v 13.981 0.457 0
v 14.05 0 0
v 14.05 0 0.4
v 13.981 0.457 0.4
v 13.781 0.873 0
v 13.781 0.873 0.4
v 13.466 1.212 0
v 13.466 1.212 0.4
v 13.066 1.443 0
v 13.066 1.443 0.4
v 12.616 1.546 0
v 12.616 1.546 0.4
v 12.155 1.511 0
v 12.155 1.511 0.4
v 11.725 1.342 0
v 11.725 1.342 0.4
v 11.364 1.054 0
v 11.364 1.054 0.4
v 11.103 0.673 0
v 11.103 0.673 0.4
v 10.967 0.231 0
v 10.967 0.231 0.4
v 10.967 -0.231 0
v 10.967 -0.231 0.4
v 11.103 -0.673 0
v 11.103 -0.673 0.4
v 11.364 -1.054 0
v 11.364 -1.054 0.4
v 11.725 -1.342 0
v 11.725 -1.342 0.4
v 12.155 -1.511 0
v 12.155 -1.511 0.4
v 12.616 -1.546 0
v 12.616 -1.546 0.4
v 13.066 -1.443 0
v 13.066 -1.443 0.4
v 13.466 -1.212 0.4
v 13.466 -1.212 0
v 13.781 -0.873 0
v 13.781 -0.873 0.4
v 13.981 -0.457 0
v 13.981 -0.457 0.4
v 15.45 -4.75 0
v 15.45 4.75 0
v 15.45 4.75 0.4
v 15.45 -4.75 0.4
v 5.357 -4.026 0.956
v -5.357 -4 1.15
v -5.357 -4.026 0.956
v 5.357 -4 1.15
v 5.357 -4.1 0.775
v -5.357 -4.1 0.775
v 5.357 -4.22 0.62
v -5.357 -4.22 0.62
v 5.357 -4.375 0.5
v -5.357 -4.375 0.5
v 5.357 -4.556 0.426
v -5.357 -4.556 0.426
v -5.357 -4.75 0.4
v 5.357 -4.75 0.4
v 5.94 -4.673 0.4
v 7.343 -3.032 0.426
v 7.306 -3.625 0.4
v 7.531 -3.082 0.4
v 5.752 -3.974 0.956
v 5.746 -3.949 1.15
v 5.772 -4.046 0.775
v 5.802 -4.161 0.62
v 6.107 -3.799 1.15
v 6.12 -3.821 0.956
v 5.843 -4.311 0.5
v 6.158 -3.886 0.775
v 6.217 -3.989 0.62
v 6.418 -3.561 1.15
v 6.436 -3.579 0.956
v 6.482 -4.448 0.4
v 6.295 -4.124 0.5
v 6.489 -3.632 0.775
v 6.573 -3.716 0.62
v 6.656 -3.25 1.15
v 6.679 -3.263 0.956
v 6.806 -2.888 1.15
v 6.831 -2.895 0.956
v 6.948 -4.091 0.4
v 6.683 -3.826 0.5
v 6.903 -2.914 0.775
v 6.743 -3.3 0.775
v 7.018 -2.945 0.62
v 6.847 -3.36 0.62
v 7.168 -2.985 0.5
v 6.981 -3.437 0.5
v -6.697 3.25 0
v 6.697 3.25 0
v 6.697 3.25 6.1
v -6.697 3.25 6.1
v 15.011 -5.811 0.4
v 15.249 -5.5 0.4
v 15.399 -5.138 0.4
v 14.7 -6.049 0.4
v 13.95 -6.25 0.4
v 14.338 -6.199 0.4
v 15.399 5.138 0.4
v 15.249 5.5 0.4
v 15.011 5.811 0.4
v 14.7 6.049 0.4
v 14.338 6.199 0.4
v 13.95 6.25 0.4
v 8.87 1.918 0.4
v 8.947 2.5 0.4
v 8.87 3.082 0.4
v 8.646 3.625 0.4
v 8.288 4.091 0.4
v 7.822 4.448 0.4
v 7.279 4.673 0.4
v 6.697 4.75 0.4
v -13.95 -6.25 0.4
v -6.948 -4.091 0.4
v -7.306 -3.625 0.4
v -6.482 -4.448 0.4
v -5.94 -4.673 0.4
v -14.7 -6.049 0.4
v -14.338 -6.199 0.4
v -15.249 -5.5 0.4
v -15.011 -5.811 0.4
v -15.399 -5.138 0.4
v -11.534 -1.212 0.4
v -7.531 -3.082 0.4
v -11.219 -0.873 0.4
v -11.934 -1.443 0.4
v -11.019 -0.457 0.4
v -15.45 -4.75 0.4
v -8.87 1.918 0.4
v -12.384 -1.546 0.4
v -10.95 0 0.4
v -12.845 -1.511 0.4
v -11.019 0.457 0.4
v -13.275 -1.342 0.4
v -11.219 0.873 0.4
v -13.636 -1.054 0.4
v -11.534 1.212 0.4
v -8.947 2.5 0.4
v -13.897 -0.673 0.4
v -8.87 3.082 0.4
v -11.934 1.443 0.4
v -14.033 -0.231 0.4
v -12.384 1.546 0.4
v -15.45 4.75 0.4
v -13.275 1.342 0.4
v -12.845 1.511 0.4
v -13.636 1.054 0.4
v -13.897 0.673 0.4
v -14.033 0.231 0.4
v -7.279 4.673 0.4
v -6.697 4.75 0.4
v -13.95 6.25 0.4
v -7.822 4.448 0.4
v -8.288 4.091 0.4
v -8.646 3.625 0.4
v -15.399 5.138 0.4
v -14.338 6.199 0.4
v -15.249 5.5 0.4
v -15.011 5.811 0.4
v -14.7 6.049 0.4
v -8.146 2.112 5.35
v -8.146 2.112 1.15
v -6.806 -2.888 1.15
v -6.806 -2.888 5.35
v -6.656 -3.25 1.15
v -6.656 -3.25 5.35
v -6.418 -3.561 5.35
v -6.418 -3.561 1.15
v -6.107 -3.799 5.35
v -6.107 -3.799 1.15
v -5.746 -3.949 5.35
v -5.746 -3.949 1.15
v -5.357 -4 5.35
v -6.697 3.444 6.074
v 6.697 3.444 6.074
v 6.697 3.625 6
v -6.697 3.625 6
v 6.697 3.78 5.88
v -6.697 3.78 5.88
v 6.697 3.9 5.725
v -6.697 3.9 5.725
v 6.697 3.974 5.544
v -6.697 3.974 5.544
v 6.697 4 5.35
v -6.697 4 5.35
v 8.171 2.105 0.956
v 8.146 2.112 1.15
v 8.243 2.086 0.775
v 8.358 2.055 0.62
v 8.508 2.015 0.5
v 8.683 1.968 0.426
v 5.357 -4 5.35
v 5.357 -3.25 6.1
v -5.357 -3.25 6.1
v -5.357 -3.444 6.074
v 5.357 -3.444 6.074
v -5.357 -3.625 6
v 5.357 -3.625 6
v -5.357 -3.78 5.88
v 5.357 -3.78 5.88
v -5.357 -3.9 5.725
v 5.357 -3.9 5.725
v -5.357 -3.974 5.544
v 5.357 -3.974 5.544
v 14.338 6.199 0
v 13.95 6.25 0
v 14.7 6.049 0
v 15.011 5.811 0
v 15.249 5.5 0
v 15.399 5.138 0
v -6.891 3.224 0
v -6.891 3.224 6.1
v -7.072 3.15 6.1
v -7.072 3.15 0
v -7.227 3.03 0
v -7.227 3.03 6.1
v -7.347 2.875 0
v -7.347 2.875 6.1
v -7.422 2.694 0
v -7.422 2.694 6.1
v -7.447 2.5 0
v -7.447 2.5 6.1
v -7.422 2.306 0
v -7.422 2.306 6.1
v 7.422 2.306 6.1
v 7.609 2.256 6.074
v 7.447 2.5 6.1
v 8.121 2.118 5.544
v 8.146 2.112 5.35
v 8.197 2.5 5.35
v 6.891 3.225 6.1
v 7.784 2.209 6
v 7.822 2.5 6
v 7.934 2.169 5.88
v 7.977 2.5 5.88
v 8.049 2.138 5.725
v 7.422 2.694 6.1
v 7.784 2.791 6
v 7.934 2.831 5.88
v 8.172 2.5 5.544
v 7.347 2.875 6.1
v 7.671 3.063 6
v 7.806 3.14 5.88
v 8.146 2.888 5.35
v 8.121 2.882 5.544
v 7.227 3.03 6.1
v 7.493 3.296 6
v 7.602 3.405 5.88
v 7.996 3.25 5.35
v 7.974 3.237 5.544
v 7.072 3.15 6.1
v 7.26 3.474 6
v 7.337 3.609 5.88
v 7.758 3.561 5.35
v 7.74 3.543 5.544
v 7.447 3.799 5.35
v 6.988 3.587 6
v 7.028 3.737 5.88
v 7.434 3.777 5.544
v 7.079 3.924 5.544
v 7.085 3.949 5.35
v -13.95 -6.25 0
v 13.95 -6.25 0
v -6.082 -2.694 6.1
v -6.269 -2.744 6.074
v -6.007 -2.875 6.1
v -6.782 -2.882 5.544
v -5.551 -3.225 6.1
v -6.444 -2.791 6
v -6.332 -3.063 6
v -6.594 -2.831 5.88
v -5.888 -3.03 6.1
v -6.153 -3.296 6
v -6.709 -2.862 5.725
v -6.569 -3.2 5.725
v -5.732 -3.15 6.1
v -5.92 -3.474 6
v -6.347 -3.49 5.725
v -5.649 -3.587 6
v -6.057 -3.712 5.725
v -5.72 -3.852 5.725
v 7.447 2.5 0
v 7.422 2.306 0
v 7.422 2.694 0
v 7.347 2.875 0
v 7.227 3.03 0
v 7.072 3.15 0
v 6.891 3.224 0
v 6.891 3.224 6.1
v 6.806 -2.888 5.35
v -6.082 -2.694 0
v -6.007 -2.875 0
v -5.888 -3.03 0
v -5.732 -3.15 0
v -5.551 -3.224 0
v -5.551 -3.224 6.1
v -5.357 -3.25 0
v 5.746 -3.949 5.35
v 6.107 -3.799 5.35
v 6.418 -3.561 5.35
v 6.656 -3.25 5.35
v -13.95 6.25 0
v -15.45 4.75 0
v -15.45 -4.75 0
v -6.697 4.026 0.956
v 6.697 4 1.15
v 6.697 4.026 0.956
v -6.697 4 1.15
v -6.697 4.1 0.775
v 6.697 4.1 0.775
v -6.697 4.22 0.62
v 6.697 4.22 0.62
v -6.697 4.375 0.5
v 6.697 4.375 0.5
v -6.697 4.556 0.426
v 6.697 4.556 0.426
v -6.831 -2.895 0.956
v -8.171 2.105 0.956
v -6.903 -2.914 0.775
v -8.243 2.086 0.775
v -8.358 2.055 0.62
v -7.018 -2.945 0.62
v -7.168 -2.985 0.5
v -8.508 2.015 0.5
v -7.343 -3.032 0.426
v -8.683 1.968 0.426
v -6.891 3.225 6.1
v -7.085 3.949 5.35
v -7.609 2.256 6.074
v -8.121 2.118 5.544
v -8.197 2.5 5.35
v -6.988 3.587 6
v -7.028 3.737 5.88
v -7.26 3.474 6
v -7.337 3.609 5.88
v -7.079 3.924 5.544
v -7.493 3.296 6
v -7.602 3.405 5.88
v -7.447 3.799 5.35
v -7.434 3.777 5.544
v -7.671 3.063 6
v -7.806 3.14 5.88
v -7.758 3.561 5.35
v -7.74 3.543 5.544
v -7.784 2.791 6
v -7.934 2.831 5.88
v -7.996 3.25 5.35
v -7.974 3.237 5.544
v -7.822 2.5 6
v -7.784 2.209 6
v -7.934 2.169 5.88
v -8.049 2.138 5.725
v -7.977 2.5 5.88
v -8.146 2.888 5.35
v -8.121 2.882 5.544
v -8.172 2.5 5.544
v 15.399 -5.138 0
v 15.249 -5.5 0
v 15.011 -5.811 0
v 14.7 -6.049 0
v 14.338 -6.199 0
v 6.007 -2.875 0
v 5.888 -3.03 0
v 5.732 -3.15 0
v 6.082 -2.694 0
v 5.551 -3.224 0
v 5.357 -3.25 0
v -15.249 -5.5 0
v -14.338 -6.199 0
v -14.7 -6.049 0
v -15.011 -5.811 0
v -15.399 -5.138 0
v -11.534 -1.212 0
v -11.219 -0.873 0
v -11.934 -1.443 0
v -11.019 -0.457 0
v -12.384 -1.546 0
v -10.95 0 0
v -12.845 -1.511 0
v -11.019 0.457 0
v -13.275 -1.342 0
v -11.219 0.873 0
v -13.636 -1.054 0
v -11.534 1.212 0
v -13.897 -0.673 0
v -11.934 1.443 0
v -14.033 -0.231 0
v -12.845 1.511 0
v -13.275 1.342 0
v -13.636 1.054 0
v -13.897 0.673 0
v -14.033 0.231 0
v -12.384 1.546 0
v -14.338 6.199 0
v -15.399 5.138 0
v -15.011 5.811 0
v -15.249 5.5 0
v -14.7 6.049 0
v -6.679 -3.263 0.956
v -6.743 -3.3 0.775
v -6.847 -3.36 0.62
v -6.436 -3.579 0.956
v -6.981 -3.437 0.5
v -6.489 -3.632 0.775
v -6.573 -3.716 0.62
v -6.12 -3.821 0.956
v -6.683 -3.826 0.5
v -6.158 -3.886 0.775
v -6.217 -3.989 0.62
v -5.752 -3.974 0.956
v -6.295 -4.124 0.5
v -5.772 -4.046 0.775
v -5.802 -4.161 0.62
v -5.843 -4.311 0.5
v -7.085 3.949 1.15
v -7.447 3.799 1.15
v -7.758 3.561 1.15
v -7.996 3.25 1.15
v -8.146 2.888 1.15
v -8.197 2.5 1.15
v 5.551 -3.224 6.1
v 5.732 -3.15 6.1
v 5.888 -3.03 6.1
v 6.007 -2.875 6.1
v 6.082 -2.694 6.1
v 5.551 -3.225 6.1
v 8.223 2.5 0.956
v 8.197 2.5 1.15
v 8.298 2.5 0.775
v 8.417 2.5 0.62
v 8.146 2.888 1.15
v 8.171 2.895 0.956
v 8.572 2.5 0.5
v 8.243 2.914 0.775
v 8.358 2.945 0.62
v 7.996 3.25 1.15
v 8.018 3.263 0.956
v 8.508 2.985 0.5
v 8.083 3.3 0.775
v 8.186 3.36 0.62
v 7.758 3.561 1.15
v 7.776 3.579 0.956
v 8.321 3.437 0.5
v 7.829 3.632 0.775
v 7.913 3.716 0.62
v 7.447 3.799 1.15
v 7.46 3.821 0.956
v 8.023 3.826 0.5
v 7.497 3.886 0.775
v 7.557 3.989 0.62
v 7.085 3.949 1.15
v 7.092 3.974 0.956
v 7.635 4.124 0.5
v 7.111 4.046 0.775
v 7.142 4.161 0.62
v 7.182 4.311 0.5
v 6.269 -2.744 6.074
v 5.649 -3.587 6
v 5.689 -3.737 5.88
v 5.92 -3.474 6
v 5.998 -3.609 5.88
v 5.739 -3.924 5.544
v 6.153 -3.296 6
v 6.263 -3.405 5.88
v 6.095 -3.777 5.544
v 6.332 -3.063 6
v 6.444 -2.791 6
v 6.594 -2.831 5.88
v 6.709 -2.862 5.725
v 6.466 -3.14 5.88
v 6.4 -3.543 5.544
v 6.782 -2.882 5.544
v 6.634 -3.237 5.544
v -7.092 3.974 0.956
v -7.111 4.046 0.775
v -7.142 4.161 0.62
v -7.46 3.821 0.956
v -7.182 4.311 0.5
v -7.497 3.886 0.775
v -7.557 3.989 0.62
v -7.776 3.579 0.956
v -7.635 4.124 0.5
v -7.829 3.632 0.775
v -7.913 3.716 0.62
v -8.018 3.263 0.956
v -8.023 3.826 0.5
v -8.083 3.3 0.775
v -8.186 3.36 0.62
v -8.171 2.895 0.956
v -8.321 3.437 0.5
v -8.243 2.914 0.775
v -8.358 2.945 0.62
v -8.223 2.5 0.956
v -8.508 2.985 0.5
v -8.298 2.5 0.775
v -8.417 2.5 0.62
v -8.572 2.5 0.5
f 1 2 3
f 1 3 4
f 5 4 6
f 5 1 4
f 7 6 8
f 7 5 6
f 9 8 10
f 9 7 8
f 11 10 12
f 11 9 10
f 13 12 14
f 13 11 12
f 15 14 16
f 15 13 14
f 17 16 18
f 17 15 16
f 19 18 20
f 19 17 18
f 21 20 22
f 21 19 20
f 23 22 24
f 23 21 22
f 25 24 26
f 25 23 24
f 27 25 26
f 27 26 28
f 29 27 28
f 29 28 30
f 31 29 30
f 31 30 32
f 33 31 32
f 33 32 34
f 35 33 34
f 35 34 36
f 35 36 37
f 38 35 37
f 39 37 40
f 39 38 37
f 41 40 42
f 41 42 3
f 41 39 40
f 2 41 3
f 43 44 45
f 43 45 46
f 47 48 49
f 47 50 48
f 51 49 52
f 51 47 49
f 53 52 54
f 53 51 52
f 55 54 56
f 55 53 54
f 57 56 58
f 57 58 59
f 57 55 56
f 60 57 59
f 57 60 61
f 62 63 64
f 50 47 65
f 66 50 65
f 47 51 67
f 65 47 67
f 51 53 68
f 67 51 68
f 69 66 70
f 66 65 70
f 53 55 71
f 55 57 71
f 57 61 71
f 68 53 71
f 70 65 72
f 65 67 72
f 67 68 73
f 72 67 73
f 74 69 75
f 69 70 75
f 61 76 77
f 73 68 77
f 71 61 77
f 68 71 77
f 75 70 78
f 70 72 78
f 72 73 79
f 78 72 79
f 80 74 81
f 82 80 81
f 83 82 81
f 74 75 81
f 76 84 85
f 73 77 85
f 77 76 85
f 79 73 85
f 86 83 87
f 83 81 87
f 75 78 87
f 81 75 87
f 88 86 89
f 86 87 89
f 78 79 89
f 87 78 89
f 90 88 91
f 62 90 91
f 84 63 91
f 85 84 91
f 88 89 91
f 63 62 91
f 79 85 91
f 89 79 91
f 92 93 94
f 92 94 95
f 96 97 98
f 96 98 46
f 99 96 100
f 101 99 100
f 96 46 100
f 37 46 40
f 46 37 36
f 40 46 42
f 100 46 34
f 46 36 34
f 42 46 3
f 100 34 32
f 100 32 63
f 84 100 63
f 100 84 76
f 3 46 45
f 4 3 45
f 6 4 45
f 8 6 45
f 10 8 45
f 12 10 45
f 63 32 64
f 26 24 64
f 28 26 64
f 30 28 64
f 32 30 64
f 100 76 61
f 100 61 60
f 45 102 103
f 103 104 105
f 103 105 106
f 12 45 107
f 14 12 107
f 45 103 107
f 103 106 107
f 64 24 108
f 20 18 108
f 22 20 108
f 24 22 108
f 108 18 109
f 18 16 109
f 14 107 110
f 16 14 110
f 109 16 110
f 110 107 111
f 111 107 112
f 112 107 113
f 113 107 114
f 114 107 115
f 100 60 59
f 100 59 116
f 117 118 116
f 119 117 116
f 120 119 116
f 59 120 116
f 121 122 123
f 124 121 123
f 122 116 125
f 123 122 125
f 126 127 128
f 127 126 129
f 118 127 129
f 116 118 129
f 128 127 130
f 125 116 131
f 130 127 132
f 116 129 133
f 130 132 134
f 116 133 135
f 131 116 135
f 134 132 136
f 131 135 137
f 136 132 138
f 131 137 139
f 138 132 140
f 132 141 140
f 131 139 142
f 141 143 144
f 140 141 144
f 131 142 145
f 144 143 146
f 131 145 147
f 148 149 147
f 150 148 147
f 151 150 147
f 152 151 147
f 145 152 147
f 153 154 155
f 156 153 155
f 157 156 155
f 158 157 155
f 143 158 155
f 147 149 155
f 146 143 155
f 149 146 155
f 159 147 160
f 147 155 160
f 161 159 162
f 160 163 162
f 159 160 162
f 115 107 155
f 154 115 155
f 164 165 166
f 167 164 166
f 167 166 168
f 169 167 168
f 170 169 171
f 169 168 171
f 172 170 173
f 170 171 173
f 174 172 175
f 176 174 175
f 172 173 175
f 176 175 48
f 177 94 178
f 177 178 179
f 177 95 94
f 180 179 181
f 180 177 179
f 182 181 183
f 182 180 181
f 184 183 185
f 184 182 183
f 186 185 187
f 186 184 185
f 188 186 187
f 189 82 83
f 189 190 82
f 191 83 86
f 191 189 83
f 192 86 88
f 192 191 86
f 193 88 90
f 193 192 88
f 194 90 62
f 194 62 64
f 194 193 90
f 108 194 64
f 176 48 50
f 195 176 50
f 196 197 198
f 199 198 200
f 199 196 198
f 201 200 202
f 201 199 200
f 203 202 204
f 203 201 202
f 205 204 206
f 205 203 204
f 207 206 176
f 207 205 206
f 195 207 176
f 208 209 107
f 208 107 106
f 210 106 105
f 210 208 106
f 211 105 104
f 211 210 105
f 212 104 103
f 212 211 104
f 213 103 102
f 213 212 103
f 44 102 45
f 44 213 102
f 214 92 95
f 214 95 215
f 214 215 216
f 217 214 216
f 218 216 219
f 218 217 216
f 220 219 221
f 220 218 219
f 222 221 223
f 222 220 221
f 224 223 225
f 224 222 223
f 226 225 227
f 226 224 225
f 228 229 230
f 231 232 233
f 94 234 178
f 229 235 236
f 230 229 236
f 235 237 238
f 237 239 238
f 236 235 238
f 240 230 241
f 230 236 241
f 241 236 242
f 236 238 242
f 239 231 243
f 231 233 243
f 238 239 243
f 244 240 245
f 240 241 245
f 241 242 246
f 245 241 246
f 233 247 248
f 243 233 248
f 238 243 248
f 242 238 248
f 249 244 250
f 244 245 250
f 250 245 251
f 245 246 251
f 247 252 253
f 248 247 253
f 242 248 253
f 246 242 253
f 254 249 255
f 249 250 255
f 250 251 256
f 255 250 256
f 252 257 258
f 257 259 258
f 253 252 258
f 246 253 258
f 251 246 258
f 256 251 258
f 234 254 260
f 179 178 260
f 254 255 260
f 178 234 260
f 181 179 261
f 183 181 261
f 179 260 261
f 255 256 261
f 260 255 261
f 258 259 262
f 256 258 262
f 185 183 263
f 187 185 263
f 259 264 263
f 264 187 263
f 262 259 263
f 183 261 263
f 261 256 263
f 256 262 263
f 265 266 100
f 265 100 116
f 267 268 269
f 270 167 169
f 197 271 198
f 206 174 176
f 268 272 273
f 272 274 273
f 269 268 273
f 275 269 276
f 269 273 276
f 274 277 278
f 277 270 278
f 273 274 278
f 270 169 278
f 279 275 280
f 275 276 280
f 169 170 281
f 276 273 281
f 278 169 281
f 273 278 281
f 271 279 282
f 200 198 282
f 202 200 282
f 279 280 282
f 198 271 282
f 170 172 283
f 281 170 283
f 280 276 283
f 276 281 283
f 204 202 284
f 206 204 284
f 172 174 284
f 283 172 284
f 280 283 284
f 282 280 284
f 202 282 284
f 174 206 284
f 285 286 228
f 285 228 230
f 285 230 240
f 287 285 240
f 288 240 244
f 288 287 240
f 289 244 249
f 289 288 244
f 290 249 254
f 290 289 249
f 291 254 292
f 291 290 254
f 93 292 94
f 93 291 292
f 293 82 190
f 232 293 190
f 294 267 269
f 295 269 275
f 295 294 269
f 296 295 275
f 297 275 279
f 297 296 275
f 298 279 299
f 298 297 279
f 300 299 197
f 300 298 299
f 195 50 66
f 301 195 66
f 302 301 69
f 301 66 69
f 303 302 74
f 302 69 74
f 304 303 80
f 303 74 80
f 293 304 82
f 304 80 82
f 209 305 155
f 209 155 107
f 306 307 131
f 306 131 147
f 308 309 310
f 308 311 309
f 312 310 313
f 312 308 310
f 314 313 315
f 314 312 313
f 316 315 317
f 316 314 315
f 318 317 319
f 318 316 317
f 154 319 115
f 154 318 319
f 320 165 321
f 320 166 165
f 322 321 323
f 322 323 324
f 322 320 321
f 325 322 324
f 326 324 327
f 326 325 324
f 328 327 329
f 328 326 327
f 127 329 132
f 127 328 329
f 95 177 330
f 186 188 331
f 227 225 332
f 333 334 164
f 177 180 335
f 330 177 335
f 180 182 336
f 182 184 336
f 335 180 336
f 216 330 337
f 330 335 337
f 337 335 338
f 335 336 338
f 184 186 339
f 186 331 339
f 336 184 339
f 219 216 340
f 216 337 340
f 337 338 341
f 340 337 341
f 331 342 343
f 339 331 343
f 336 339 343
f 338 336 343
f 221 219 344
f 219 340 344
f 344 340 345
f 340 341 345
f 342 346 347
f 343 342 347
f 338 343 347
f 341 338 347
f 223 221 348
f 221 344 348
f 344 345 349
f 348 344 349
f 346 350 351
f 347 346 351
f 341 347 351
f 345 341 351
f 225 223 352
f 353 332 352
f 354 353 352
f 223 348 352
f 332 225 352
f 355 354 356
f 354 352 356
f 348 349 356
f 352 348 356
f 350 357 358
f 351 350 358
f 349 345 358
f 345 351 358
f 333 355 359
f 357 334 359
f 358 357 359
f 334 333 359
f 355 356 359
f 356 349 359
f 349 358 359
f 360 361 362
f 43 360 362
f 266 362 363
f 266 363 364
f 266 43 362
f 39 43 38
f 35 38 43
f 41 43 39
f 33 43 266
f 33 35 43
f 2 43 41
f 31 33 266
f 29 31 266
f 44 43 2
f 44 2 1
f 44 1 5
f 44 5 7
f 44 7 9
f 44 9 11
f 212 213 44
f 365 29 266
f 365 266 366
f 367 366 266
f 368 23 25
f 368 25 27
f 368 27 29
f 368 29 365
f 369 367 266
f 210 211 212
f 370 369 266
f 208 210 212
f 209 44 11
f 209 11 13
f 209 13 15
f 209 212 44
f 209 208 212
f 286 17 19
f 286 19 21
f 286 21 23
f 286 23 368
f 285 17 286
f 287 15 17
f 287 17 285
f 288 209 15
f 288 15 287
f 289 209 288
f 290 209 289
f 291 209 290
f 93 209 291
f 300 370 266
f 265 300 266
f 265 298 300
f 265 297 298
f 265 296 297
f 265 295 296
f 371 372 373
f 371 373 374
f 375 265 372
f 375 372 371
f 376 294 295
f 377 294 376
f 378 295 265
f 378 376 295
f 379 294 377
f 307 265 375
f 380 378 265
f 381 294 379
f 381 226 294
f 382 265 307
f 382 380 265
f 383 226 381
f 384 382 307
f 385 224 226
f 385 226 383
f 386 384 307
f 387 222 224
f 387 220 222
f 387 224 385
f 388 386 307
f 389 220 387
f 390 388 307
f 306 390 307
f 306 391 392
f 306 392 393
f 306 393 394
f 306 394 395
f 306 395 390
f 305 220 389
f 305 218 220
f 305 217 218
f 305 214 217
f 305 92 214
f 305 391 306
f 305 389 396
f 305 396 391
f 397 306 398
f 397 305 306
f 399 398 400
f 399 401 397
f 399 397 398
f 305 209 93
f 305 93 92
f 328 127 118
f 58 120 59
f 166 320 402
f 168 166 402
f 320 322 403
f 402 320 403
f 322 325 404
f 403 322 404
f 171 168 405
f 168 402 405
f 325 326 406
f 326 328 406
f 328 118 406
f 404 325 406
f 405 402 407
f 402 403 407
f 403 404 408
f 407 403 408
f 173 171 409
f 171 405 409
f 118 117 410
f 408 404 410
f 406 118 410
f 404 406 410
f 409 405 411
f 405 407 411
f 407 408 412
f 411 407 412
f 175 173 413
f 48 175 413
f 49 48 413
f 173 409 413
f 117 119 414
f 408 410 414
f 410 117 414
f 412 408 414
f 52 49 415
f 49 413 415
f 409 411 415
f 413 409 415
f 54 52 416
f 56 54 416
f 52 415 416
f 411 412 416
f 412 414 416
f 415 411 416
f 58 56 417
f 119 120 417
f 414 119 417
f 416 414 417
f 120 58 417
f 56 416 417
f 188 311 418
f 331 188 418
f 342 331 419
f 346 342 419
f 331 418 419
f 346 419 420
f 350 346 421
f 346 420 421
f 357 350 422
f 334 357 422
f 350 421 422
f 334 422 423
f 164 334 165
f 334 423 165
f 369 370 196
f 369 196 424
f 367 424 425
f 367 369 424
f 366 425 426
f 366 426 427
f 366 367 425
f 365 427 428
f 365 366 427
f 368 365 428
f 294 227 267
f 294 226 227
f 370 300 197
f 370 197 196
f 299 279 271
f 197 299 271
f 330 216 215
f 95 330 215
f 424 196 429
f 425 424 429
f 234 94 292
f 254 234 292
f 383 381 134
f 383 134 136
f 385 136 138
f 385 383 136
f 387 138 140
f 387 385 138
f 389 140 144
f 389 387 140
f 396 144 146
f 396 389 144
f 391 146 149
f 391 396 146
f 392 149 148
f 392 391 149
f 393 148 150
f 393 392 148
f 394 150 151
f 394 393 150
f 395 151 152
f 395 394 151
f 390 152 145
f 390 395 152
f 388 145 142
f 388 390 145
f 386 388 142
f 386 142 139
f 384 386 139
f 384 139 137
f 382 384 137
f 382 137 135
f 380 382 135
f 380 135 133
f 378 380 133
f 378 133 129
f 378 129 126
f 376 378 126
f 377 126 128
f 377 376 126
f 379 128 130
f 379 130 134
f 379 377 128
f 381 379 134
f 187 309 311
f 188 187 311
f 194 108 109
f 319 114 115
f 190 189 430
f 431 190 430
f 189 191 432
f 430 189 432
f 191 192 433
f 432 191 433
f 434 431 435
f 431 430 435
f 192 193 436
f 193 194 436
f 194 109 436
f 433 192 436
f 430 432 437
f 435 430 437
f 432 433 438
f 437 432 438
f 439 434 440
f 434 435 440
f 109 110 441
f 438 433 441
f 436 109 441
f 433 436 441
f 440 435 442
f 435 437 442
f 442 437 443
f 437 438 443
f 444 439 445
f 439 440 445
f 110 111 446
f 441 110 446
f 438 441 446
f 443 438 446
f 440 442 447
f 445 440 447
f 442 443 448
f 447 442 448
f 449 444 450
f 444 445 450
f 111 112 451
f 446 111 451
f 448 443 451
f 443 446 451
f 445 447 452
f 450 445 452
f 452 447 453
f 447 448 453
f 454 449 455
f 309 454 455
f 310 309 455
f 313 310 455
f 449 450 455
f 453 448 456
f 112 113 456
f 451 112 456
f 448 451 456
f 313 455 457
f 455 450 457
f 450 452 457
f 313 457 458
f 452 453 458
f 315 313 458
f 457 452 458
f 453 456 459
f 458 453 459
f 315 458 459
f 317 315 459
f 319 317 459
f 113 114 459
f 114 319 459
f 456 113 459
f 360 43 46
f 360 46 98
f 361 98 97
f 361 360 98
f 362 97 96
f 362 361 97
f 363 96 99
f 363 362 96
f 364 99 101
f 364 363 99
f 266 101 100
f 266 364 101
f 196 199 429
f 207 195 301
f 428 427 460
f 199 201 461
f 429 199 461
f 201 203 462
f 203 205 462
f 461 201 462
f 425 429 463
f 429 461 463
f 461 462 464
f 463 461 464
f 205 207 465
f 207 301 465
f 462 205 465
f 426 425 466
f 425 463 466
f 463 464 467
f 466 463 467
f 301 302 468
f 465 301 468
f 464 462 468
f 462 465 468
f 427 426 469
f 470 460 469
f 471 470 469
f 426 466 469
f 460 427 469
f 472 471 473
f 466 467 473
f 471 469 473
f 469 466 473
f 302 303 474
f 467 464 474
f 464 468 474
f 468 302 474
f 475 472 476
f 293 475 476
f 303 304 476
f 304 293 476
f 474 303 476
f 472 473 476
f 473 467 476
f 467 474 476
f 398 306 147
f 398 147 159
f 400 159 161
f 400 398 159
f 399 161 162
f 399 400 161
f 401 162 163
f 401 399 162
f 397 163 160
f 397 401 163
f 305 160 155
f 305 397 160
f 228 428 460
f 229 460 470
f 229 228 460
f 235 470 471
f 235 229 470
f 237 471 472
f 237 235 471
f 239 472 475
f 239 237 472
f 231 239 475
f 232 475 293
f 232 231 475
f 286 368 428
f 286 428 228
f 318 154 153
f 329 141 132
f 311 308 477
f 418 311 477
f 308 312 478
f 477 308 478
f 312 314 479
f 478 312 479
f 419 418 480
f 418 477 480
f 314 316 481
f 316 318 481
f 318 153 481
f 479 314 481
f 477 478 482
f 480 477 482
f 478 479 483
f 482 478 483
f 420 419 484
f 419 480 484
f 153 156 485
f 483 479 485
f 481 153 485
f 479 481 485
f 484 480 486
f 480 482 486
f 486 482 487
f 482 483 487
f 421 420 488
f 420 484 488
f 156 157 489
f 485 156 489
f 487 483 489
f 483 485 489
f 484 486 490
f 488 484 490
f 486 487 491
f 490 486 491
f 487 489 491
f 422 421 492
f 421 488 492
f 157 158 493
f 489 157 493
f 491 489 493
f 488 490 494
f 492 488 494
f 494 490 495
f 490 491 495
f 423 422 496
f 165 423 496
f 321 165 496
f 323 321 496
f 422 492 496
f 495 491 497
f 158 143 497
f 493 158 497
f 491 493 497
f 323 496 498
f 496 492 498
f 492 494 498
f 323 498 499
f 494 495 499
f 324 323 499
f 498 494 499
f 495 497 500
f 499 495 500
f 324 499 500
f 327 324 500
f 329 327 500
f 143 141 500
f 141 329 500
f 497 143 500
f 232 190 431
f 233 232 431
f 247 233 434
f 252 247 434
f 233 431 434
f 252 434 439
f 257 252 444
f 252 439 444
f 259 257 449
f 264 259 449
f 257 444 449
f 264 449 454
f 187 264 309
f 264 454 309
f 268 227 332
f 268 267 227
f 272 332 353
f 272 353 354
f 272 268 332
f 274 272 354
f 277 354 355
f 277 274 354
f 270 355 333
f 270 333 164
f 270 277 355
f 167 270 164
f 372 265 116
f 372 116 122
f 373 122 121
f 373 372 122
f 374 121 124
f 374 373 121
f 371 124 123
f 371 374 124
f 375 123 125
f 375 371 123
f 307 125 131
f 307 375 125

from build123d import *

# Parameters (mm, degrees)
SKETCH1_R           = 1.55
BOSS_EXTRUDE1_DEPTH = 0.4
BOSS_EXTRUDE2_DEPTH = 5.7
FILLET1_R           = 0.75


with BuildPart() as part:
    # Sketch1 → Boss-Extrude1 (new body)
    with BuildSketch(Plane.XY):
        with BuildLine():
            Line((-13.95, 6.25), (13.95, 6.25))
            ThreePointArc((13.95, 6.25), (15.010660172, 5.810660172), (15.45, 4.75))
            Line((15.45, 4.75), (15.45, -4.75))
            ThreePointArc((15.45, -4.75), (15.010660172, -5.810660172), (13.95, -6.25))
            Line((13.95, -6.25), (-13.95, -6.25))
            ThreePointArc((-13.95, -6.25), (-15.010660172, -5.810660172), (-15.45, -4.75))
            Line((-15.45, -4.75), (-15.45, 4.75))
            ThreePointArc((-15.45, 4.75), (-15.010660172, 5.810660172), (-13.95, 6.25))
        make_face()
        with Locations((-12.5, 0)):
            Circle(SKETCH1_R, mode=Mode.SUBTRACT)
        with Locations((12.5, 0)):
            Circle(SKETCH1_R, mode=Mode.SUBTRACT)
        with BuildLine():
            Line((-6.697085729, 3.25), (6.697085729, 3.25))
            ThreePointArc((6.697085729, 3.25), (7.292100735, 2.956571072), (7.421530099, 2.305885716))
            Line((7.421530099, 2.305885716), (6.081784137, -2.694114284))
            ThreePointArc((6.081784137, -2.694114284), (5.813910839, -3.095015005), (5.357339767, -3.25))
            Line((5.357339767, -3.25), (-5.357339767, -3.25))
            ThreePointArc((-5.357339767, -3.25), (-5.813910839, -3.095015005), (-6.081784137, -2.694114284))
            Line((-6.081784137, -2.694114284), (-7.421530099, 2.305885716))
            ThreePointArc((-7.421530099, 2.305885716), (-7.292100735, 2.956571072), (-6.697085729, 3.25))
        make_face(mode=Mode.SUBTRACT)
    extrude(amount=BOSS_EXTRUDE1_DEPTH)

    # Sketch2 → Boss-Extrude2 (add)
    with BuildSketch(Plane.XY.offset(0.4)):
        with BuildLine():
            Line((6.697085729, 4), (-6.697085729, 4))
            ThreePointArc((-6.697085729, 4), (-7.88711574, 3.413142144), (-8.145974469, 2.111771432))
            Line((-8.145974469, 2.111771432), (-6.806228507, -2.888228568))
            ThreePointArc((-6.806228507, -2.888228568), (-6.270481911, -3.69003001), (-5.357339767, -4))
            Line((-5.357339767, -4), (5.357339767, -4))
            ThreePointArc((5.357339767, -4), (6.270481911, -3.69003001), (6.806228507, -2.888228568))
            Line((6.806228507, -2.888228568), (8.145974469, 2.111771432))
            ThreePointArc((8.145974469, 2.111771432), (7.88711574, 3.413142144), (6.697085729, 4))
        make_face()
        with BuildLine():
            Line((-7.421530099, 2.305885716), (-6.081784137, -2.694114284))
            ThreePointArc((-6.081784137, -2.694114284), (-5.813910839, -3.095015005), (-5.357339767, -3.25))
            Line((-5.357339767, -3.25), (5.357339767, -3.25))
            ThreePointArc((5.357339767, -3.25), (5.813910839, -3.095015005), (6.081784137, -2.694114284))
            Line((6.081784137, -2.694114284), (7.421530099, 2.305885716))
            ThreePointArc((7.421530099, 2.305885716), (7.292100735, 2.956571072), (6.697085729, 3.25))
            Line((6.697085729, 3.25), (-6.697085729, 3.25))
            ThreePointArc((-6.697085729, 3.25), (-7.292100735, 2.956571072), (-7.421530099, 2.305885716))
        make_face(mode=Mode.SUBTRACT)
    extrude(amount=BOSS_EXTRUDE2_DEPTH)

    # Fillet1
    fillet1_edges = [part.edges().sort_by_distance(p)[0] for p in [
        (-6.270481911, -3.69003001, 6.1),
        (0, -4, 6.1),
        (6.270481911, -3.69003001, 6.1),
        (7.476101488, -0.388228568, 6.1),
        (7.88711574, 3.413142144, 6.1),
        (0, 4, 6.1),
        (-7.88711574, 3.413142144, 6.1),
        (-7.476101488, -0.388228568, 6.1),
        (-6.270481911, -3.69003001, 0.4),
        (0, -4, 0.4),
        (6.270481911, -3.69003001, 0.4),
        (7.476101488, -0.388228568, 0.4),
        (7.88711574, 3.413142144, 0.4),
        (0, 4, 0.4),
        (-7.88711574, 3.413142144, 0.4),
        (-7.476101488, -0.388228568, 0.4),
    ]]
    fillet(fillet1_edges, radius=FILLET1_R - 0.0001)  # a hair under: the kernel refuses the full size


solid = part.part
